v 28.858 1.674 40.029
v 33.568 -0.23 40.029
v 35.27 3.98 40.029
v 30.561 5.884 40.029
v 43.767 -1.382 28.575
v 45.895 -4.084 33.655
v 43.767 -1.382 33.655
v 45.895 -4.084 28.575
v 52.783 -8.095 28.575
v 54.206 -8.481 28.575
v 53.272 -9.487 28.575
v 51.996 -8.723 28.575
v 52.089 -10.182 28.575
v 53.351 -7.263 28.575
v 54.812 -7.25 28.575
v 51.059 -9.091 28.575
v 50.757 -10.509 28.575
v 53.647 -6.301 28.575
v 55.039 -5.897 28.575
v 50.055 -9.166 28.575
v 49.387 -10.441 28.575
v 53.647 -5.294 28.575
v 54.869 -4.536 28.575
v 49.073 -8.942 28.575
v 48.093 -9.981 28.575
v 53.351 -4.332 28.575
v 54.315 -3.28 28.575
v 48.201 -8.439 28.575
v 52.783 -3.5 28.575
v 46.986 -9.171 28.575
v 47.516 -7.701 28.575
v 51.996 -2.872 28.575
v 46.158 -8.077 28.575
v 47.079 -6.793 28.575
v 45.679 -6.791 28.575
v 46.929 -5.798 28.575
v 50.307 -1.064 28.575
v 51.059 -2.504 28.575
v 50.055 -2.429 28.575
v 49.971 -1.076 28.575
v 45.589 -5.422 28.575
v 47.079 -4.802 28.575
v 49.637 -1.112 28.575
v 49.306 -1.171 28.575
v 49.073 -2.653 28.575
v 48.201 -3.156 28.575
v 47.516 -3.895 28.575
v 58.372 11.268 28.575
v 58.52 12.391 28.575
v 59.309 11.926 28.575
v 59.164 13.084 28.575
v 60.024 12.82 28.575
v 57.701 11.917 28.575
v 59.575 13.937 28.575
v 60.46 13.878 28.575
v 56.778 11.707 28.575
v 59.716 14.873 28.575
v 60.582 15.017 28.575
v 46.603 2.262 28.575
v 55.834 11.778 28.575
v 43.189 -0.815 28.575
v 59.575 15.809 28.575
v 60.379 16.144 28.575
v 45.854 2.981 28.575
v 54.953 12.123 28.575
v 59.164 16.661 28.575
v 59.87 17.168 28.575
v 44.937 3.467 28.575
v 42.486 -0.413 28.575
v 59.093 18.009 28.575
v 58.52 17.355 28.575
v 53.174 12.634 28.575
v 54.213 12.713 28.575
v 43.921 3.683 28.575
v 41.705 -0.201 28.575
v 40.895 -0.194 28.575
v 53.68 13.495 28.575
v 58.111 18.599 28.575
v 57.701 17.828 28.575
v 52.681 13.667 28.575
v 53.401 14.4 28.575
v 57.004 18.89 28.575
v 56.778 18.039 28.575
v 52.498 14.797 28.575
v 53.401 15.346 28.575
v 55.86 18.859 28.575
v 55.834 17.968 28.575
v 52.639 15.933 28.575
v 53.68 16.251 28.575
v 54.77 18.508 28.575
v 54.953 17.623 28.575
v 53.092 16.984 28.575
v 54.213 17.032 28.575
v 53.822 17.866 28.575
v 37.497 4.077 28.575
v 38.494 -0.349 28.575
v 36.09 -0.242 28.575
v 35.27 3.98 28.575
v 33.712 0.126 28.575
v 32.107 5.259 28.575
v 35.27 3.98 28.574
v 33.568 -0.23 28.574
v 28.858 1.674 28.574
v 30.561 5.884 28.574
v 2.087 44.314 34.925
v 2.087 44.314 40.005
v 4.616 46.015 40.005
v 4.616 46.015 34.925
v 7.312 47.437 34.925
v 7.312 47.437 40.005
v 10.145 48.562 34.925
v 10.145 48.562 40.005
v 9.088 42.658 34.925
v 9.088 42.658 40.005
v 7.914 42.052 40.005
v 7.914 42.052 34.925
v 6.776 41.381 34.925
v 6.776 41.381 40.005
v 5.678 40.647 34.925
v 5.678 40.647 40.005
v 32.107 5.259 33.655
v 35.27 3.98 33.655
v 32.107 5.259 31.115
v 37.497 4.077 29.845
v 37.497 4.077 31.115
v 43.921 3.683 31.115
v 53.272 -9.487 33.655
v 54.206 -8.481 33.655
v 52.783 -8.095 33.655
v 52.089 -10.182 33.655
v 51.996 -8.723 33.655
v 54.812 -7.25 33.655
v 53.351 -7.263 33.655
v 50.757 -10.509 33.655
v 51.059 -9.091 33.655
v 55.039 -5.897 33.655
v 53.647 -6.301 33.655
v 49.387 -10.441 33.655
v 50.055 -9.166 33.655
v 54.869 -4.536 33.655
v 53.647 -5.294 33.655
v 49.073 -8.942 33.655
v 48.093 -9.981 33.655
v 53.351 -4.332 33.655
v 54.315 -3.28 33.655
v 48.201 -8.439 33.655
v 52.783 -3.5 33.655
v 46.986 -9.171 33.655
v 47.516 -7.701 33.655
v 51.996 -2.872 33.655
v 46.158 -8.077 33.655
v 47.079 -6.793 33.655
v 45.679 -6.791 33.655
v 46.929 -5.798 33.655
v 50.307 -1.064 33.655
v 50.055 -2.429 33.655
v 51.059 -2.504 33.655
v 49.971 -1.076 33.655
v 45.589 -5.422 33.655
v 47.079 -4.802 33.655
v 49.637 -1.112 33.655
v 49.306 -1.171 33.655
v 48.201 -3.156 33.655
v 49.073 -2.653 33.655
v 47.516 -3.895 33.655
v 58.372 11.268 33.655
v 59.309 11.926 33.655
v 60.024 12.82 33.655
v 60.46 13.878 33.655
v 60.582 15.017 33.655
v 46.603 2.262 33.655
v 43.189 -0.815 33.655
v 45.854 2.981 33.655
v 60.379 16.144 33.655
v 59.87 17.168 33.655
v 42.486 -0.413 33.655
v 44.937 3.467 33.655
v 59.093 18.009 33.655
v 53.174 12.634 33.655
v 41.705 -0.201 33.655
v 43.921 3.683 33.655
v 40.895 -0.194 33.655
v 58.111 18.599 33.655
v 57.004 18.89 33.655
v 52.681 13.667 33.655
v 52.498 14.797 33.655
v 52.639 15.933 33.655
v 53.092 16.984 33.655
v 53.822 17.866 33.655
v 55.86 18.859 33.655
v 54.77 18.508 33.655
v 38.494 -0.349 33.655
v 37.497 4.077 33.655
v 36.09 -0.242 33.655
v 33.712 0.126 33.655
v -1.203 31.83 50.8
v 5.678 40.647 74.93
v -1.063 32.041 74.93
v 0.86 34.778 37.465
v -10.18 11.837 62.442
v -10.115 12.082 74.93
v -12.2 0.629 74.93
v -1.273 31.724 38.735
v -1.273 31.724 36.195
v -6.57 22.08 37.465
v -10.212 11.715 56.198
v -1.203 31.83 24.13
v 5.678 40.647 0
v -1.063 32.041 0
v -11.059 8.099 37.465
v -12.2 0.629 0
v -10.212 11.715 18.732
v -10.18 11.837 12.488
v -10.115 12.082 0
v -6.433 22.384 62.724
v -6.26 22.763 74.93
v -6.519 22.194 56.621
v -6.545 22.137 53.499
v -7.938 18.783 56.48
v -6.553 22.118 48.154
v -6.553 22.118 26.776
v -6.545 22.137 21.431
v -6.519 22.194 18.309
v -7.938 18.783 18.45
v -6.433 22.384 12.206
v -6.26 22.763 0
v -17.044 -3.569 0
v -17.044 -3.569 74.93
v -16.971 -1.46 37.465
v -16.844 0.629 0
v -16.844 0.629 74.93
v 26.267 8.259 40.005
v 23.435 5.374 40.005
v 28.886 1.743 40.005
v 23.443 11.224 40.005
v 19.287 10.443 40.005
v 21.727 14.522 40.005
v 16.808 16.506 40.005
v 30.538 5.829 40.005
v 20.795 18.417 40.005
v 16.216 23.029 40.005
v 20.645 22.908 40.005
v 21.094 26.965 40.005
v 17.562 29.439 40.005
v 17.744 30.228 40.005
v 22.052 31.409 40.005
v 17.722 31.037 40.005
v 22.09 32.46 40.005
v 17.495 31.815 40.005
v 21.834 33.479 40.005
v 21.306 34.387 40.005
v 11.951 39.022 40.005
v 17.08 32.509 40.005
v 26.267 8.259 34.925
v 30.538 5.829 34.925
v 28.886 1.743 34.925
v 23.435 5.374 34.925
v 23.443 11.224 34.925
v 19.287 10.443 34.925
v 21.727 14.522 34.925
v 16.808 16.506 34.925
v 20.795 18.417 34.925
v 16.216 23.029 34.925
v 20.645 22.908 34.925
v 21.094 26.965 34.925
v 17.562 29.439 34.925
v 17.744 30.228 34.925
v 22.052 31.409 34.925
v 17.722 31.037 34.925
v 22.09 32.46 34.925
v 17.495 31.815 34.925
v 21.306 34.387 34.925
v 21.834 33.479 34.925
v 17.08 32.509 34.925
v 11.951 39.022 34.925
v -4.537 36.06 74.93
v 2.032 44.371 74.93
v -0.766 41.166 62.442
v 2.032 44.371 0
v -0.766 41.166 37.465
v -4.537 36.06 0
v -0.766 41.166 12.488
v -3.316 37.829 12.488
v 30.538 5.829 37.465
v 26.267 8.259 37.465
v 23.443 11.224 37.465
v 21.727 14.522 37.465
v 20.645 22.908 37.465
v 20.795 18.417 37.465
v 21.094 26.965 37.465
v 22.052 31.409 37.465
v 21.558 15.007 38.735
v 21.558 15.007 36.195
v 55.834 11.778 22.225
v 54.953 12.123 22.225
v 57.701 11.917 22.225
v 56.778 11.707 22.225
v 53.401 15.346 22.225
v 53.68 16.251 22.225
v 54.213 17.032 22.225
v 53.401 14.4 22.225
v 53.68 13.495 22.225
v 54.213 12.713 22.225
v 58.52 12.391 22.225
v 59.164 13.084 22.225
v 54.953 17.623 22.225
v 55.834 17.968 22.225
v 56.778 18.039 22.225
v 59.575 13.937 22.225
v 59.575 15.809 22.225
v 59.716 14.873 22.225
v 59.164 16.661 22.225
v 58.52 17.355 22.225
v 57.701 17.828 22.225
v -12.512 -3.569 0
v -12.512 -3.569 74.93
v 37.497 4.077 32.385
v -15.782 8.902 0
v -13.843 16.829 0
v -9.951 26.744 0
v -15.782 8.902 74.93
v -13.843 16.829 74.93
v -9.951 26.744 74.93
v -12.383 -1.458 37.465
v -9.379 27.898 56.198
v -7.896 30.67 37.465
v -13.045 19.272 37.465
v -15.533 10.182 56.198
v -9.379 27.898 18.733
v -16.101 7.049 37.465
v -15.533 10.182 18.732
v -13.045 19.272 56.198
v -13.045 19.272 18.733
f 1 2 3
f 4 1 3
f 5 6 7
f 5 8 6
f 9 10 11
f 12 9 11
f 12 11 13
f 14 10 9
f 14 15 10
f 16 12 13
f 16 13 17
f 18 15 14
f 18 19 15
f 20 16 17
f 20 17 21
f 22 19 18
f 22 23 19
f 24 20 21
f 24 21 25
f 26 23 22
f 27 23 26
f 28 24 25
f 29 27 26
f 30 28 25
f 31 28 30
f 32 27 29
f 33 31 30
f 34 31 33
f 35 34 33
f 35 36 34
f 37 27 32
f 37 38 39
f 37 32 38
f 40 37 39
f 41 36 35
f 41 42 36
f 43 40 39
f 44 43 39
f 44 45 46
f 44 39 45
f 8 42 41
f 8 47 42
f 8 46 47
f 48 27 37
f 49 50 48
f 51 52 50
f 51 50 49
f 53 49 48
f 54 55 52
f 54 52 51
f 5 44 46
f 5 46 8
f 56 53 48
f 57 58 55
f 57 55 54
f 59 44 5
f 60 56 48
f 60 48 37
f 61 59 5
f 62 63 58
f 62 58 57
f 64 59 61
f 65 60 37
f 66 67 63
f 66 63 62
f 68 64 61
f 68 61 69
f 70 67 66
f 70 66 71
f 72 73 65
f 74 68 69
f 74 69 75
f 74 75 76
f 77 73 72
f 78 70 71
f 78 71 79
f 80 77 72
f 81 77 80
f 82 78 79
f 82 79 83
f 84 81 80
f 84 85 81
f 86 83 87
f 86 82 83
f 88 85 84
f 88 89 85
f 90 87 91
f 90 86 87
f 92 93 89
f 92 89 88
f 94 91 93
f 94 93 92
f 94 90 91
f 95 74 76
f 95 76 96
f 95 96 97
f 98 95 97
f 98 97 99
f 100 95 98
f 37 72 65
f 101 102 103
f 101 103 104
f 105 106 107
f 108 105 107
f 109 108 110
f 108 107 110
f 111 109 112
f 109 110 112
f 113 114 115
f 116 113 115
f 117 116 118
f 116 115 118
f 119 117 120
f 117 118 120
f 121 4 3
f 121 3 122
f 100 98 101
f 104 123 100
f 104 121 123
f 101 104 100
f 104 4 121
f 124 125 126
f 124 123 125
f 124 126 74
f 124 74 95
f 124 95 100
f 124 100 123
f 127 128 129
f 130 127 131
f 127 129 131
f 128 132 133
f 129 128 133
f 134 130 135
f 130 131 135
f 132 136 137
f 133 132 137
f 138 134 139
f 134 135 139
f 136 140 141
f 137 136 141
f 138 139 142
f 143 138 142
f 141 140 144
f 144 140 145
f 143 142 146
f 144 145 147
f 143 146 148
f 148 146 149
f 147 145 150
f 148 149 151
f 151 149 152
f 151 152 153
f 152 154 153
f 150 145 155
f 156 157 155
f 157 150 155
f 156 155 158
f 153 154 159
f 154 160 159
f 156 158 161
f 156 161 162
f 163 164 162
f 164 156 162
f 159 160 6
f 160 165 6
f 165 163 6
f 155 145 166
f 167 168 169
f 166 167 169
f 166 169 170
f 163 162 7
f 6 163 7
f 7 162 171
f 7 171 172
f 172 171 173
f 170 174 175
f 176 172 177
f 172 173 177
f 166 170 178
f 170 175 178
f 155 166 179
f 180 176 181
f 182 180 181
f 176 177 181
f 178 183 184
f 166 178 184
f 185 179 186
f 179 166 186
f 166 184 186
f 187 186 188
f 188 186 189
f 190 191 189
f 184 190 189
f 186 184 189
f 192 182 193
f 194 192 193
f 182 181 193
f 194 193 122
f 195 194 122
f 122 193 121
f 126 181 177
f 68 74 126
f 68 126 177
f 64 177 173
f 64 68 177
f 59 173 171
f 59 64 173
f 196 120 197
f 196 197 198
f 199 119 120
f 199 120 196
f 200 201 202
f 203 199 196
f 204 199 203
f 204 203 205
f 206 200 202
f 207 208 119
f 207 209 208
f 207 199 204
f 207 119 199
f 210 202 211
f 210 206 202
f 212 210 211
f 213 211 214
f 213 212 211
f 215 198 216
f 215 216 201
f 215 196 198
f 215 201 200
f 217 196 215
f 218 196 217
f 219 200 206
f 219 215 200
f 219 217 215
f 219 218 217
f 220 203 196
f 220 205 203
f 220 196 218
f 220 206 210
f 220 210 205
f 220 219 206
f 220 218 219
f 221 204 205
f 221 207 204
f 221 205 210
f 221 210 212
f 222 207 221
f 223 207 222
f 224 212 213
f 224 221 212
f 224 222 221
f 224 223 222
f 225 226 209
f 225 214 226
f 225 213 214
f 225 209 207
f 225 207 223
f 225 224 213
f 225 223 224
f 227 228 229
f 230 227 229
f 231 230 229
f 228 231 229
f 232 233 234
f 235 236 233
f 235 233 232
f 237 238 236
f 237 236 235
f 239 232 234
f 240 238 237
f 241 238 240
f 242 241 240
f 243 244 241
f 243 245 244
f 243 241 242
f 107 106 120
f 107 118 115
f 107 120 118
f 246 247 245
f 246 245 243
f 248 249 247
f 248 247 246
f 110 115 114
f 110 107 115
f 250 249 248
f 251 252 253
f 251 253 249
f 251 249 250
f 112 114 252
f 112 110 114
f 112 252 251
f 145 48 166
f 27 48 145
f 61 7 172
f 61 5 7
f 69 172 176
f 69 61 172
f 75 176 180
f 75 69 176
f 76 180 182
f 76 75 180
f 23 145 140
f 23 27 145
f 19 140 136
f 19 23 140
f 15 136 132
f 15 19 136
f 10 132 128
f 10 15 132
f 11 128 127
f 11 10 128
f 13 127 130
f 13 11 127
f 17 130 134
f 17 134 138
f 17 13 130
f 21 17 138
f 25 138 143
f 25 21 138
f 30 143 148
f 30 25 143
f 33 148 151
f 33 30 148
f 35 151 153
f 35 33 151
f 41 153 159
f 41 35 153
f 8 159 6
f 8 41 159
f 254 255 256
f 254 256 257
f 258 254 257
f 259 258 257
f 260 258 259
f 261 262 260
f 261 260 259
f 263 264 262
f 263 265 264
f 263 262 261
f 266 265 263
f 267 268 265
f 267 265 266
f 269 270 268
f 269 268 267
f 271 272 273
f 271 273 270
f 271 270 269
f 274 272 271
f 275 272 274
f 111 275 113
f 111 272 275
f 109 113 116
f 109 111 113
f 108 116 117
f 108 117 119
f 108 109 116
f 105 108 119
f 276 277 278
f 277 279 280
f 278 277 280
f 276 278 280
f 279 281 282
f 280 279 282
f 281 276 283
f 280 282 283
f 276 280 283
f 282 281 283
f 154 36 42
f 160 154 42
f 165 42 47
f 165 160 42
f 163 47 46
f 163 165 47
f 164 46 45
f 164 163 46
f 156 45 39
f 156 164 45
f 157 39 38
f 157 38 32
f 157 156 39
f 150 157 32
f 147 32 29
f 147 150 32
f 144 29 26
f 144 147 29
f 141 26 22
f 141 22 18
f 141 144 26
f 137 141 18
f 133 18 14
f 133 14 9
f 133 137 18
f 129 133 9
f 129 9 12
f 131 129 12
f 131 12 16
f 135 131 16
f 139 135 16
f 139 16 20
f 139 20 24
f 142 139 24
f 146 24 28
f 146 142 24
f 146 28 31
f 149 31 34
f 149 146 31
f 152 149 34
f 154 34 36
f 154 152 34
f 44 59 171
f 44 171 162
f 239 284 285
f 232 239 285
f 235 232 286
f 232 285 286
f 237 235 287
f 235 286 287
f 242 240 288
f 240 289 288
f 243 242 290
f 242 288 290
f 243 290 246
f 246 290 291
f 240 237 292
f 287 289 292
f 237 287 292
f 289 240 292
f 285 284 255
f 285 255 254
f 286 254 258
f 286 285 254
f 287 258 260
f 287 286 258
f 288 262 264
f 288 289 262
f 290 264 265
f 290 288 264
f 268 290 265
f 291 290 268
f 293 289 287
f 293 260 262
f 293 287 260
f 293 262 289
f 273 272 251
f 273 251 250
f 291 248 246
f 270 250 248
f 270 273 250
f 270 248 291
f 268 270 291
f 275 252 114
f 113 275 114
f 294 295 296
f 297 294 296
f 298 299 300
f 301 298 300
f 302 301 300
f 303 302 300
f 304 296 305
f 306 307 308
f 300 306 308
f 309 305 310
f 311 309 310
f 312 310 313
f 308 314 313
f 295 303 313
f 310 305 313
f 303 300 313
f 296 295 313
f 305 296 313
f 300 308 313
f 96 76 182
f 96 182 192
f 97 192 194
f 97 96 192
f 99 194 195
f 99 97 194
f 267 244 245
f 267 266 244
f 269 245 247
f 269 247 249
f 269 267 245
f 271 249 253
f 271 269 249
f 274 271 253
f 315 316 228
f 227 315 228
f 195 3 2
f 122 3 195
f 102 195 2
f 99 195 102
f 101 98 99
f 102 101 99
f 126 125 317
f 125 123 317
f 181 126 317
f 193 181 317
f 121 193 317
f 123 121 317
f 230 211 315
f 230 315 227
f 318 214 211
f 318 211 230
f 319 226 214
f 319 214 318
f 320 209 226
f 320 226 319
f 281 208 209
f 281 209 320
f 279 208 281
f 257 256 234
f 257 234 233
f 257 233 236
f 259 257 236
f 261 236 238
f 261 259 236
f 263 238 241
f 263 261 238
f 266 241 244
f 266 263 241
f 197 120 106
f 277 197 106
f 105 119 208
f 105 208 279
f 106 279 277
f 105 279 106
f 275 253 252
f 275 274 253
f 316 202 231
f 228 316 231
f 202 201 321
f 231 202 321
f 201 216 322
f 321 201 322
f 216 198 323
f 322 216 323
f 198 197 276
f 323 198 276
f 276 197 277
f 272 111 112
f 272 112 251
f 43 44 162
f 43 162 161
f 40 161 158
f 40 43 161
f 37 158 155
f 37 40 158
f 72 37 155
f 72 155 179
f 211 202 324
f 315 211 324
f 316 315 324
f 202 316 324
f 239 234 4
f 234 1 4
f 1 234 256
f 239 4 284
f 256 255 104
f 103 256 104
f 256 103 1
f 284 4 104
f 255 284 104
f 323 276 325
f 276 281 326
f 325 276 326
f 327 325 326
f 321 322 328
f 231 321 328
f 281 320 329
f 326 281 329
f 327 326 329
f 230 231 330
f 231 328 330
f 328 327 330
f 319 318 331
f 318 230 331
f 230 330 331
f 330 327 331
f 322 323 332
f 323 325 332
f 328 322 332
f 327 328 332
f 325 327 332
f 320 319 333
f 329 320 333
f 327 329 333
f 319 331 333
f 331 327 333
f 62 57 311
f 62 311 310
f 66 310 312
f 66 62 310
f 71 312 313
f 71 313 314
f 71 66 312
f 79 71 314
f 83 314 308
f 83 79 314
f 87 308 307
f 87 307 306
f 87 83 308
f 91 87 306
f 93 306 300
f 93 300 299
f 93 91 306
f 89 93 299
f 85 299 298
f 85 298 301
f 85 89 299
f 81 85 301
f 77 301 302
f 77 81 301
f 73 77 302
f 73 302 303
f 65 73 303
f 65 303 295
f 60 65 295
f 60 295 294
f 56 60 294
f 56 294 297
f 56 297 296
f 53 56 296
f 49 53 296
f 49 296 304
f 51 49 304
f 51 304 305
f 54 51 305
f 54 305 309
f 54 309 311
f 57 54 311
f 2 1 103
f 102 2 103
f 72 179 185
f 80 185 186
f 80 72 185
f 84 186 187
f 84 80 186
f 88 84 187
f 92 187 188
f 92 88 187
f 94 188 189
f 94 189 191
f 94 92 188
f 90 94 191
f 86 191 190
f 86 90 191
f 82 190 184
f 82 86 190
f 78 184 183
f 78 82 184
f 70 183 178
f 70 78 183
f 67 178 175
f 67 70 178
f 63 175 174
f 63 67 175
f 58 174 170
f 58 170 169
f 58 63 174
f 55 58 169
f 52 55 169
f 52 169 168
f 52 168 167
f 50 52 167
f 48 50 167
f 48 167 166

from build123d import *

# Parameters (mm, degrees)
BOSS_EXTRUDE1_DEPTH      = 74.93
BOSS_EXTRUDE4_DEPTH      = 2.54
BOSS_EXTRUDE4_DEPTH_BACK = 2.54
BOSS_EXTRUDE6_DEPTH      = 74.93
BOSS_EXTRUDE7_DEPTH      = 74.93
SKETCH11_R               = 3.3782
BOSS_EXTRUDE8_DEPTH      = 2.54
SKETCH12_R               = 3.175
BOSS_EXTRUDE9_DEPTH      = 11.43
SKETCH14_W               = 11.454369962
SKETCH14_H               = 4.541337636
BOSS_EXTRUDE10_DEPTH     = 5.08
SKETCH16_R               = 4.043569484
BOSS_EXTRUDE11_DEPTH     = 5.08


with BuildPart() as part:
    # Sketch1 → Boss-Extrude1 (new body)
    with BuildSketch(Plane.XY):
        with BuildLine():
            Line((-16.295773791, 0.624640473), (-12.907508233, 0.624640473))
            Line((-12.907508233, 0.624640473), (-12.443267089, 3.164640473))
            add(Edge.make_bspline(
                [(-12.443267089, 3.164640473), (-12.30668745, 3.911907895), (-11.89696139, 6.153716378), (-11.35075536, 9.142778811), (-10.941162808, 11.384616955), (-10.804635025, 12.131895145)],
                knots=[0.002076118, 0.002076118, 0.002076118, 0.002076118, 0.004355051, 0.008912916, 0.011191849, 0.011191849, 0.011191849, 0.011191849], degree=3))
            add(Edge.make_bspline(
                [(-10.804635025, 12.131895145), (-10.131787944, 14.813925559), (-8.428636773, 20.08894476), (-4.769918918, 27.602373316), (-0.882056925, 33.370017928), (2.696640916, 37.629074894), (4.663596703, 39.6688962), (5.677623009, 40.647244333)],
                knots=[-0.595137067, -0.595137067, -0.595137067, -0.595137067, -0.254899084, 0.0853389, 0.425576884, 0.595695875, 0.765814867, 0.765814867, 0.765814867, 0.765814867], degree=3))
            Line((5.677623009, 40.647244333), (2.03170084, 44.371046934))
            add(Edge.make_bspline(
                [(2.03170084, 44.371046934), (1.545061943, 43.849333503), (0.584048879, 42.784657511), (-1.227882281, 40.634272171), (-4.205920413, 36.737641226), (-7.868630072, 30.842728735), (-11.285075765, 23.259160615), (-12.891126954, 17.928422411), (-13.516382283, 15.22778531)],
                knots=[0.192222826, 0.192222826, 0.192222826, 0.192222826, 0.287167093, 0.38211136, 0.571999893, 0.951776961, 1.331554028, 1.711331096, 1.711331096, 1.711331096, 1.711331096], degree=3))
            add(Edge.make_bspline(
                [(-13.516382283, 15.22778531), (-13.707651088, 14.222513225), (-14.09021448, 12.211975656), (-14.664139503, 9.196174334), (-15.238140346, 6.180406911), (-15.620861993, 4.169893716), (-15.812232602, 3.164640473)],
                knots=[-0.00268258, -0.00268258, -0.00268258, -0.00268258, 0.000387339, 0.003457258, 0.006527177, 0.009597097, 0.009597097, 0.009597097, 0.009597097], degree=3))
            Line((-15.812232602, 3.164640473), (-16.295773791, 0.624640473))
        make_face()
    extrude(amount=BOSS_EXTRUDE1_DEPTH)

    # Sketch4 → Boss-Extrude4 (add, two sides: drawn at the far end of the back side and taken through both)
    with BuildSketch(Plane(origin=(0, 0, 37.465), x_dir=(-1, 0, 0), z_dir=(0, 0, -1)).offset(-BOSS_EXTRUDE4_DEPTH_BACK)):
        with BuildLine():
            Line((-5.677623009, 40.647244333), (-2.087143894, 44.314419562))
            ThreePointArc((-2.087143894, 44.314419562), (-5.945357936, 46.761917563), (-10.144870483, 48.561961011))
            Line((-10.144870483, 48.561961011), (-12.342217859, 43.933321468))
            ThreePointArc((-12.342217859, 43.933321468), (-8.878894593, 42.556020468), (-5.677623009, 40.647244333))
        make_face()
    extrude(amount=BOSS_EXTRUDE4_DEPTH + BOSS_EXTRUDE4_DEPTH_BACK)

    # Sketch8 → Boss-Extrude6 (add)
    with BuildSketch(Plane(origin=(0, 0, 0), x_dir=(-1, 0, 0), z_dir=(0, 0, -1))):
        with BuildLine():
            Line((12.199993526, 0.628671187), (16.843743367, 0.628671187))
            add(Edge.make_bspline(
                [(-2.03170084, 44.371046934), (15.008940659, 25.494574417), (16.843743367, 0.628671187)],
                knots=[0, 0, 0, 1, 1, 1], degree=2))
            Line((-2.03170084, 44.371046934), (-5.677623009, 40.647244333))
            add(Edge.make_bspline(
                [(-5.677623009, 40.647244333), (9.879032096, 23.52153238), (12.199993526, 0.628671187)],
                knots=[0, 0, 0, 1, 1, 1], degree=2))
        make_face()
    extrude(amount=-BOSS_EXTRUDE6_DEPTH)

    # Sketch10 → Boss-Extrude7 (add)
    with BuildSketch(Plane.XY.offset(74.93)):
        with BuildLine():
            add(Edge.make_bspline(
                [(-17.044210577, -3.569022053), (-16.99706974, -1.449262713), (-16.843743367, 0.628671187)],
                knots=[0, 0, 0, 1, 1, 1], degree=2))
            Line((-16.843743367, 0.628671187), (-16.295006462, 0.628671187))
            Line((-16.295006462, 0.628671187), (-16.295773791, 0.624640473))
            Line((-16.295773791, 0.624640473), (-12.907508233, 0.624640473))
            Line((-12.907508233, 0.624640473), (-12.906771531, 0.628671187))
            Line((-12.906771531, 0.628671187), (-12.199993526, 0.628671187))
            add(Edge.make_bspline(
                [(-12.199993526, 0.628671187), (-12.410380076, -1.44648182), (-12.512012235, -3.569022053)],
                knots=[0, 0, 0, 1, 1, 1], degree=2))
            Line((-12.512012235, -3.569022053), (-17.044210577, -3.569022053))
        make_face()
    extrude(amount=-BOSS_EXTRUDE7_DEPTH)

    # Sketch11 → Boss-Extrude8 (add, symmetric)
    with BuildSketch(Plane(origin=(0, 0, 37.465), x_dir=(-1, 0, 0), z_dir=(0, 0, -1))):
        with BuildLine():
            Line((-6.661648357, 45.739913105), (-10.144870483, 48.561961011))
            Line((-10.144870483, 48.561961011), (-21.306209309, 34.387494774))
            ThreePointArc((-21.306209309, 34.387494774), (-21.997885217, 32.978248014), (-22.052439991, 31.409358033))
            add(Edge.make_bspline(
                [(-43.921175132, 3.682891736), (-14.804010115, 3.685410597), (-22.052439991, 31.409358033)],
                knots=[0, 0, 0, 1, 1, 1], degree=2))
            ThreePointArc((-43.921175132, 3.682891736), (-45.412252296, 3.255494908), (-46.603036961, 2.261507464))
            Line((-46.603036961, 2.261507464), (-49.3060524, -1.171217021))
            ThreePointArc((-49.3060524, -1.171217021), (-49.803661042, -1.091013739), (-50.306976812, -1.06417788))
            Line((-50.306976812, -1.06417788), (-53.763973591, 15.454073405))
            ThreePointArc((-53.763973591, 15.454073405), (-56.832870033, 17.694796121), (-59.377686579, 14.872939923))
            Line((-59.377686579, 14.872939923), (-54.315487208, -3.280299501))
            ThreePointArc((-54.315487208, -3.280299501), (-50.756874344, -10.509444763), (-45.894543202, -4.084337558))
            Line((-45.894543202, -4.084337558), (-43.766648862, -1.381994502))
            ThreePointArc((-43.766648862, -1.381994502), (-42.486290668, -0.41252926), (-40.895291759, -0.193663017))
            ThreePointArc((-40.895291759, -0.193663017), (-20.913927056, 8.075766362), (-17.561546975, 29.439285396))
            ThreePointArc((-17.561546975, 29.439285396), (-17.72193531, 31.037238944), (-17.079804086, 32.509260496))
            Line((-17.079804086, 32.509260496), (-11.95129503, 39.022267547))
            Line((-11.95129503, 39.022267547), (-6.661648357, 45.739913105))
        make_face()
        with Locations((-50.306976812, -5.797526095)):
            Circle(SKETCH11_R, mode=Mode.SUBTRACT)
    extrude(amount=BOSS_EXTRUDE8_DEPTH, both=True)

    # Sketch12 → Boss-Extrude9 (add)
    with BuildSketch(Plane.XY.offset(40.005)):
        with Locations((56.540750517, 14.872939923)):
            Circle(SKETCH12_R)
    extrude(amount=-BOSS_EXTRUDE9_DEPTH)


with BuildPart() as body_2:
    # Split1: the piece on the far side of the plane
    add(part.part)
    split(bisect_by=Plane(origin=(24.222018339, -9.793178229, 0), x_dir=(-0.37483189290442787, -0.9270927958201831, 0), z_dir=(-0.9270927958201831, 0.37483189290442787, 0)), keep=Keep.BOTTOM)


with BuildPart() as part_1:
    add(part.part)

    # Split1
    split(bisect_by=Plane(origin=(24.222018339, -9.793178229, 0), x_dir=(-0.37483189290442787, -0.9270927958201831, 0), z_dir=(-0.9270927958201831, 0.37483189290442787, 0)), keep=Keep.TOP)



with BuildPart() as body_2_1:
    # Body-Move/Copy1: moved
    add(body_2.part.moved(Location((0, 0, -6.35))))


with BuildPart() as part_2:
    add(part_1.part)

    add(body_2_1.part)  # Boss-Extrude10 merges body 2
    # Sketch14 → Boss-Extrude10 (add)
    with BuildSketch(Plane(origin=(24.222018339, -9.793178229, 0), x_dir=(0, 0, -1), z_dir=(0.9270927958201831, -0.37483189290442787, 0))):
        with Locations((-34.301669156, 14.639573878)):
            Rectangle(SKETCH14_W, SKETCH14_H)
    extrude(amount=BOSS_EXTRUDE10_DEPTH)

    # Sketch16 → Boss-Extrude11 (add)
    with BuildSketch(Plane(origin=(0, 0, 28.575), x_dir=(-1, 0, 0), z_dir=(0, 0, -1))):
        with Locations((-56.540750517, 14.872939923)):
            Circle(SKETCH16_R)
    extrude(amount=-BOSS_EXTRUDE11_DEPTH)


solid = part_2.part
